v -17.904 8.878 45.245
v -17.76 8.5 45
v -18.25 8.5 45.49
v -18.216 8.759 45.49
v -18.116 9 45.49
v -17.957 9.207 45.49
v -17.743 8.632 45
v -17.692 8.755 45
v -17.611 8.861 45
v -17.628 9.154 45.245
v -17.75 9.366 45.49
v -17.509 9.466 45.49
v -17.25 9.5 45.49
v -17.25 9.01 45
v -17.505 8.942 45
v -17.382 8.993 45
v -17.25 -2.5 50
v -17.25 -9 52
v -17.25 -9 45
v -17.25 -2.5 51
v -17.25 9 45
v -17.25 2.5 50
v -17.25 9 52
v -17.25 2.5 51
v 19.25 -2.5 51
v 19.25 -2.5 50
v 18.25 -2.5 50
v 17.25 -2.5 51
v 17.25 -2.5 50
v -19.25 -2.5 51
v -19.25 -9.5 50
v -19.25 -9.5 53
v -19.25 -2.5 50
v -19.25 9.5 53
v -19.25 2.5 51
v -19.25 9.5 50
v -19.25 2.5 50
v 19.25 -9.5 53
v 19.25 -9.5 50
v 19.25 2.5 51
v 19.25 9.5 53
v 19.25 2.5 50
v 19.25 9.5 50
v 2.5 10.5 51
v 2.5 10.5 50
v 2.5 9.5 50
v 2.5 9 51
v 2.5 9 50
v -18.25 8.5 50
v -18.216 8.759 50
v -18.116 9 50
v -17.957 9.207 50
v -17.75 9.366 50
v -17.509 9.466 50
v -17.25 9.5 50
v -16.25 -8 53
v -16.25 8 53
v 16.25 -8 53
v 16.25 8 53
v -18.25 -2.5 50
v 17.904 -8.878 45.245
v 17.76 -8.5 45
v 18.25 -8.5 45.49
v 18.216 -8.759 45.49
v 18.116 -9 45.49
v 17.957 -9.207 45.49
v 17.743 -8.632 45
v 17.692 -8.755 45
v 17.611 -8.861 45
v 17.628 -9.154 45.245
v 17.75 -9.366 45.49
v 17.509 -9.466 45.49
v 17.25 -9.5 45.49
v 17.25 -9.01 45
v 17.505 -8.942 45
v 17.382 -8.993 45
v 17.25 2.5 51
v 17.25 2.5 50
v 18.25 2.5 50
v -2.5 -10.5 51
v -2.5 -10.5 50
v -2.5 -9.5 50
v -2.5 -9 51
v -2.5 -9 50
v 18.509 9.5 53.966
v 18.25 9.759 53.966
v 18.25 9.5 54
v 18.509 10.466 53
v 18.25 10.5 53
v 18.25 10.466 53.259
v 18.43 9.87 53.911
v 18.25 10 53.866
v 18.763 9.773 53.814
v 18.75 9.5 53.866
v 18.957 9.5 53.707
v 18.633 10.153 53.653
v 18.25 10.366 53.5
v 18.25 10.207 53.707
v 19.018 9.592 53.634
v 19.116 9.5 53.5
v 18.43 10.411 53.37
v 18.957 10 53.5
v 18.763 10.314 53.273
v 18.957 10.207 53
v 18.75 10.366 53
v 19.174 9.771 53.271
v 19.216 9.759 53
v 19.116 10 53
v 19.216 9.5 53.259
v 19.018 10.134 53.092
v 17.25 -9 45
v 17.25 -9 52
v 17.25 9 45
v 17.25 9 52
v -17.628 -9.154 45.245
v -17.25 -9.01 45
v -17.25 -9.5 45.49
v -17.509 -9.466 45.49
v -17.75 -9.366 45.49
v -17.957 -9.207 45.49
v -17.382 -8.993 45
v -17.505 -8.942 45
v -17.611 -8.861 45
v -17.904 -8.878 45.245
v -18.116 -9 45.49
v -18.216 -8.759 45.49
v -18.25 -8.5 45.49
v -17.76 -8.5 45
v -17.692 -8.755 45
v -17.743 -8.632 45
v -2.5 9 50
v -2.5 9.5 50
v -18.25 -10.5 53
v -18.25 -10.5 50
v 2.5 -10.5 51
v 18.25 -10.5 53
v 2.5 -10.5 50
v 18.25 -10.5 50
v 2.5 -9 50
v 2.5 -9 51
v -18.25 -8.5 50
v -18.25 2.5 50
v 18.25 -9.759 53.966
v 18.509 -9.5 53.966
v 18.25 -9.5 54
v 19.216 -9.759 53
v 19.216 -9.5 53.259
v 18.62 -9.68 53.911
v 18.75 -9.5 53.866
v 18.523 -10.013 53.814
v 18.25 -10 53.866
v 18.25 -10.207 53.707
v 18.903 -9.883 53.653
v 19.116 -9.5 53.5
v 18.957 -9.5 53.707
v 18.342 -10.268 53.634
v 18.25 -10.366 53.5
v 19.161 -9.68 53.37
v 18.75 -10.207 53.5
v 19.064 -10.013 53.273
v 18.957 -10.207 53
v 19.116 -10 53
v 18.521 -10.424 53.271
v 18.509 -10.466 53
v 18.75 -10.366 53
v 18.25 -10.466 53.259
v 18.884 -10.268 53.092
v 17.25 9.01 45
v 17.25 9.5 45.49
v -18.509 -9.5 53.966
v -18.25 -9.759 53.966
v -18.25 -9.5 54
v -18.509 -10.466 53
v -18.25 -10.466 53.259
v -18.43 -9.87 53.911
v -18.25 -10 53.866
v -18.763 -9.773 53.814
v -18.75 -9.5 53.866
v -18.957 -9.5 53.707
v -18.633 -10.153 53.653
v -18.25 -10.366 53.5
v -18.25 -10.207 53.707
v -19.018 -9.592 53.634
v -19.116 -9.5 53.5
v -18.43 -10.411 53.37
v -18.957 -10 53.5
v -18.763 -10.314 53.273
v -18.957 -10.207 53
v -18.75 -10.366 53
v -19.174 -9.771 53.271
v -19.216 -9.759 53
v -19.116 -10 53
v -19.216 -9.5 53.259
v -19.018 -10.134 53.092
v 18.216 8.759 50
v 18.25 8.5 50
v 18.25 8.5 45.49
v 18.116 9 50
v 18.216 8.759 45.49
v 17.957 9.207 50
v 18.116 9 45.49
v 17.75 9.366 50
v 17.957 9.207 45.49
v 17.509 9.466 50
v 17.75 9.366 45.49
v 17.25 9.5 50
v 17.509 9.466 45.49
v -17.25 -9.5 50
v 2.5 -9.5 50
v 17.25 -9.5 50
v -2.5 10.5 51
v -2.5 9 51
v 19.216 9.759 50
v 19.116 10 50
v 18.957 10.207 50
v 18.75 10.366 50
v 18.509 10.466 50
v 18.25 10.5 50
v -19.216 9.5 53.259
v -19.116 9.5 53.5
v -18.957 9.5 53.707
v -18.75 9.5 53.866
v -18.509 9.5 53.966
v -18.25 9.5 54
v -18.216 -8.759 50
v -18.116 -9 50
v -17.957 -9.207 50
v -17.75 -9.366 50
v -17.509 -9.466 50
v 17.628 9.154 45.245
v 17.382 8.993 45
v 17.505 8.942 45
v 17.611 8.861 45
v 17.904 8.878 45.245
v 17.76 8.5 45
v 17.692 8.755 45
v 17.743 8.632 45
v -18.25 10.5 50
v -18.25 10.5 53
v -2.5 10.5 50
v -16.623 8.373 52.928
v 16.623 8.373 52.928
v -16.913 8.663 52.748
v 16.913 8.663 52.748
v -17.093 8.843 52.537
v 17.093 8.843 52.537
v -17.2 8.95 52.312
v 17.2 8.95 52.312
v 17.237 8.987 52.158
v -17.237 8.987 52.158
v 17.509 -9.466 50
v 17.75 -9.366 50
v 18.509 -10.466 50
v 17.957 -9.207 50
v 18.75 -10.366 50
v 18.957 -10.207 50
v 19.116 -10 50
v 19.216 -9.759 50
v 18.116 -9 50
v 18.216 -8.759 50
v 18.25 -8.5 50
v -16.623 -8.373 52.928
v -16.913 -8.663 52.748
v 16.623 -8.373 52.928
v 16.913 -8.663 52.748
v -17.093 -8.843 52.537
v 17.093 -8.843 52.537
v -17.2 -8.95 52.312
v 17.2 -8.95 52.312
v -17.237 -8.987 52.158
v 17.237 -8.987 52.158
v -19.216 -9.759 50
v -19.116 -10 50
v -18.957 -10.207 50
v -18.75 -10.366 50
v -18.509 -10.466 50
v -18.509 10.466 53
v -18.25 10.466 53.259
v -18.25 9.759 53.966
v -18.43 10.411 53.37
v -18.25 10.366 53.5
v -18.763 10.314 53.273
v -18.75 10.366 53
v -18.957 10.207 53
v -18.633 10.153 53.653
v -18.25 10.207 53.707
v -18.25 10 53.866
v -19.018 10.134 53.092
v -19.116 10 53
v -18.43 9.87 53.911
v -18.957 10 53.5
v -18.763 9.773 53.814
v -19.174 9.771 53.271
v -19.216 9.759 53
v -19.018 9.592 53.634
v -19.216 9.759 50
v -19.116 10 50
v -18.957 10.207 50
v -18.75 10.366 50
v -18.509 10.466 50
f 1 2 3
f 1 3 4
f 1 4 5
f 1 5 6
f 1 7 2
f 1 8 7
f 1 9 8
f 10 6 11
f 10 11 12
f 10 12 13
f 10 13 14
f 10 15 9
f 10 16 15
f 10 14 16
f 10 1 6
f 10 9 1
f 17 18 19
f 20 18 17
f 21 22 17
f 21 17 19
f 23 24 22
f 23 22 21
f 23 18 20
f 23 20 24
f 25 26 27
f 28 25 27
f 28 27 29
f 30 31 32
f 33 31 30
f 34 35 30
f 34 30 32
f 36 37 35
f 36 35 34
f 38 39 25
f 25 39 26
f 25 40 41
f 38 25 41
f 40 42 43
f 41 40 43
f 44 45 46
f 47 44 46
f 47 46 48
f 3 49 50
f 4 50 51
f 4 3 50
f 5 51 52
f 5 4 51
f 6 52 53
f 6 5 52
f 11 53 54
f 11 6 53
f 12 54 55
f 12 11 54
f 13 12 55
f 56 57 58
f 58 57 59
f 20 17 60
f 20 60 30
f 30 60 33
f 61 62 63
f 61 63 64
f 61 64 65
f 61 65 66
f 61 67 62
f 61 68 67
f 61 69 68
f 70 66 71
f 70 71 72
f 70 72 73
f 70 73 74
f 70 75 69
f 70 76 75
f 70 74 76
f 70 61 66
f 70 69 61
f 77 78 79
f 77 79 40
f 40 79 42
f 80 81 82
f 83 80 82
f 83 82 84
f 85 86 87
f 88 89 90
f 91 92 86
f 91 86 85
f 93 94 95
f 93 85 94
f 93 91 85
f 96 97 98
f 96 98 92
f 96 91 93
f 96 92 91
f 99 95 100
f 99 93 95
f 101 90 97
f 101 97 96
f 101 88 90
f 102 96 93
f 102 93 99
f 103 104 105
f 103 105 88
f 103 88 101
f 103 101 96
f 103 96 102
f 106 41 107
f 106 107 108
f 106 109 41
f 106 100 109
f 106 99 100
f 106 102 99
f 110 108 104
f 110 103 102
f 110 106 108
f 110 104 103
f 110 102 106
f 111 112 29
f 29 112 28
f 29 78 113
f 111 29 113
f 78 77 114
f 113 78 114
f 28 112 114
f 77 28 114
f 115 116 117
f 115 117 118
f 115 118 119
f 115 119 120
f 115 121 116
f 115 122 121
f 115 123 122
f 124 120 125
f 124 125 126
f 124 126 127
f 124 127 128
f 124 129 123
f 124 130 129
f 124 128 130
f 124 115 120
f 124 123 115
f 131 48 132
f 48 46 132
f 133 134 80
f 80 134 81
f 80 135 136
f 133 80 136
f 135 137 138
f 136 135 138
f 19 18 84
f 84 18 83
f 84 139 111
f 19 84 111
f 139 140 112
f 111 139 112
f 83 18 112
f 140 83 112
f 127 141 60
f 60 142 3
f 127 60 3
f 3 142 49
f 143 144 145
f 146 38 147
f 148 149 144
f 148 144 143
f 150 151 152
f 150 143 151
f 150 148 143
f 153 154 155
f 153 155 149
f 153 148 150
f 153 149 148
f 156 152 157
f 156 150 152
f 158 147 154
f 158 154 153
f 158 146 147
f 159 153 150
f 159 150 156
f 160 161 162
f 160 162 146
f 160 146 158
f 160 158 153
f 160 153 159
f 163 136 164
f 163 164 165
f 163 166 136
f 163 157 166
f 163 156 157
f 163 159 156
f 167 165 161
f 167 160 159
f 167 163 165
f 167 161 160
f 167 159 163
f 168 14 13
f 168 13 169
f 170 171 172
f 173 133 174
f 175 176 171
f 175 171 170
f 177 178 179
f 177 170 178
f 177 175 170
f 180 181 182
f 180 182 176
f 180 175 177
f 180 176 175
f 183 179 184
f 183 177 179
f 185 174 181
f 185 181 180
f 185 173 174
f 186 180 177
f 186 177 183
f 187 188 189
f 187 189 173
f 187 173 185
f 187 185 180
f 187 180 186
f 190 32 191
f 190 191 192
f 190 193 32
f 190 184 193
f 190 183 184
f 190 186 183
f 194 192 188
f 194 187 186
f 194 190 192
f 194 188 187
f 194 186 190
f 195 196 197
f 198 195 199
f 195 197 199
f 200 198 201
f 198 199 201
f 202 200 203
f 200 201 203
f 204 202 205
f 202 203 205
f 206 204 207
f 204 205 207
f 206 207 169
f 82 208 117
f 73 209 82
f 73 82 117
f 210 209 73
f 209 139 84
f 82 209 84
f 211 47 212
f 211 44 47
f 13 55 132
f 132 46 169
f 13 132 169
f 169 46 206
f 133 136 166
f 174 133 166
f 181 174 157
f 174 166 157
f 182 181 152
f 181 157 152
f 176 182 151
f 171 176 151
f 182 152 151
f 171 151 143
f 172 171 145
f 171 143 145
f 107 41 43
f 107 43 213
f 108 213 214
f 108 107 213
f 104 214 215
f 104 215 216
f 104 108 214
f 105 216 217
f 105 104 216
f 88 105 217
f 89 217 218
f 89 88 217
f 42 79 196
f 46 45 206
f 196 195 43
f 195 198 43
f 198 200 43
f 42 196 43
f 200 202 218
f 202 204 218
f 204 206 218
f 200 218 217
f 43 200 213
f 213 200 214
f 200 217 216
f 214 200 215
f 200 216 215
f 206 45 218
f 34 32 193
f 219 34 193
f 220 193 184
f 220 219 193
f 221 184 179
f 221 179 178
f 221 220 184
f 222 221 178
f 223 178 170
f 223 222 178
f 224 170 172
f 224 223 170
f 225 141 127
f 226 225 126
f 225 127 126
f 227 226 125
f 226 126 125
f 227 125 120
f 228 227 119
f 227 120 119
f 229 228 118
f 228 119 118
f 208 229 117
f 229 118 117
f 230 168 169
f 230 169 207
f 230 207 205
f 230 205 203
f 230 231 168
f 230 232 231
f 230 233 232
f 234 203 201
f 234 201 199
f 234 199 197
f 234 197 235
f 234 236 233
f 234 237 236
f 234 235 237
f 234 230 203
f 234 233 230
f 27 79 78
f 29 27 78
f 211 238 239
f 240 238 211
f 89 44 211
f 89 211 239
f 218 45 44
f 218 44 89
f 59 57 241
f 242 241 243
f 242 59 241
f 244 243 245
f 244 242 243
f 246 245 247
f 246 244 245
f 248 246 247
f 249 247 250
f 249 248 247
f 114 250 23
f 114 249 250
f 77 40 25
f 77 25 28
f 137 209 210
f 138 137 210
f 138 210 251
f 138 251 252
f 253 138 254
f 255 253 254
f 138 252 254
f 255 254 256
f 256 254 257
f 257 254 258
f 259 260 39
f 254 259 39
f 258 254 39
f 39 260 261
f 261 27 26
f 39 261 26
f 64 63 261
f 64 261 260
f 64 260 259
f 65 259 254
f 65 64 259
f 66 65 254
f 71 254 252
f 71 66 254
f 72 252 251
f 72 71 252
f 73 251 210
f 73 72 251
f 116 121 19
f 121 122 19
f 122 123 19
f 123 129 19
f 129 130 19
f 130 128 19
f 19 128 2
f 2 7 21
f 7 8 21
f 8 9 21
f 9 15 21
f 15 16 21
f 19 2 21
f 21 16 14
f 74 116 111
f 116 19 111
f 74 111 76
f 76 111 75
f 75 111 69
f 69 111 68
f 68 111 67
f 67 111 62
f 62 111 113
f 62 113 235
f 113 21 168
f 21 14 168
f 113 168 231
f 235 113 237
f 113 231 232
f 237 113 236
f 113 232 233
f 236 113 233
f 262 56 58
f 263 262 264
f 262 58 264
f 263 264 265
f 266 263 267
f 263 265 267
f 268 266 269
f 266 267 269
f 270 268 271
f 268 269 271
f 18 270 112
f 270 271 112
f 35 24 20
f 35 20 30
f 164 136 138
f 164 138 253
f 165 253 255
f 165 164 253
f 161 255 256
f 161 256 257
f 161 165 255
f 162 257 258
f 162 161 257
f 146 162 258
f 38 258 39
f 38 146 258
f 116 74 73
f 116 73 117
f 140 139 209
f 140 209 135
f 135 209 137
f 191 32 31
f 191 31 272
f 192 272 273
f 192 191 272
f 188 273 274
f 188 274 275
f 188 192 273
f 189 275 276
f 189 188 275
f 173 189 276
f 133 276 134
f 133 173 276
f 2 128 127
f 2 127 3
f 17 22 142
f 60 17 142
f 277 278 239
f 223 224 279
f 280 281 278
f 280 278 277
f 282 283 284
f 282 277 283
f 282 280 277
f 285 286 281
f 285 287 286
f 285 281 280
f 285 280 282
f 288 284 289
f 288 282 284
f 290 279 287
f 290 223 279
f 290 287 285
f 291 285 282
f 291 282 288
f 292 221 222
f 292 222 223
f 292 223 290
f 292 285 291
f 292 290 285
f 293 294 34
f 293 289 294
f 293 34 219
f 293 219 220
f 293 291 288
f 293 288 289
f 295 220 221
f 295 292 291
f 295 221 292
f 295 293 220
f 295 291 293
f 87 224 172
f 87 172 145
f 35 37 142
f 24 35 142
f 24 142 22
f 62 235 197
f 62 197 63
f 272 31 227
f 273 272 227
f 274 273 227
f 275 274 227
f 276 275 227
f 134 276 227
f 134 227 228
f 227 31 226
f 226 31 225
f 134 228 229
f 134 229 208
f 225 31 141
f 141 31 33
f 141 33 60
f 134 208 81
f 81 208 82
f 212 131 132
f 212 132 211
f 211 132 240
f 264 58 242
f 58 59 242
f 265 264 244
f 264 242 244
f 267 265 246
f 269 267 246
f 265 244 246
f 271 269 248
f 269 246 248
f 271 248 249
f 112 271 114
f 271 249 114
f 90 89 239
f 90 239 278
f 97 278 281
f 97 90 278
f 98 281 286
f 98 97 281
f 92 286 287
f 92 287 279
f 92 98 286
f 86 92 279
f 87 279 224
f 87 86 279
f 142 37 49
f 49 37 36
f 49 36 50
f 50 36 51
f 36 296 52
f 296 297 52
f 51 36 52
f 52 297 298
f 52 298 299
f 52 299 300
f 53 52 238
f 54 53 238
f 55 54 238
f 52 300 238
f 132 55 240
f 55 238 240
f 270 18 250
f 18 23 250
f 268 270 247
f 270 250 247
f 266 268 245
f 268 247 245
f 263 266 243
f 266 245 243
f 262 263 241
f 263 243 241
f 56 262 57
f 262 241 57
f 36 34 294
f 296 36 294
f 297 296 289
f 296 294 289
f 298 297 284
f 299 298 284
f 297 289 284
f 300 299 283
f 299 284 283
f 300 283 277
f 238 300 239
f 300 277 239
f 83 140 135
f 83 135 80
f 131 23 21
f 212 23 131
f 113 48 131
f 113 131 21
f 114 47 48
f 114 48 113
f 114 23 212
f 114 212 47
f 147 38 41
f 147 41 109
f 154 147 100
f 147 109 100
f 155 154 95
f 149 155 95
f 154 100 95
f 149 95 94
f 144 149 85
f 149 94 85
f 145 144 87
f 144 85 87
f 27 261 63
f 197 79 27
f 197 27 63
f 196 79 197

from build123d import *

# Parameters (mm, degrees)
SKETCH025_W       = 36.5
SKETCH025_H       = 19
PAD016_DEPTH      = 3
THICKNESS004_T    = 1
SKETCH026_W       = 36.5
SKETCH026_H       = 19
SKETCH026_W_2     = 34.5
SKETCH026_H_2     = 18
PAD017_DEPTH      = 3
PAD017_DEPTH_BACK = 5
FILLET005_R       = 1
POCKET007_DEPTH   = 1
CHAMFER002_SIZE   = 0.49


with BuildPart() as part:
    # Sketch025 → Pad016 (new body)
    with BuildSketch(Plane.XY):
        Rectangle(SKETCH025_W, SKETCH025_H)
    extrude(amount=PAD016_DEPTH)

    # Thickness004
    thickness004_openings = [part.faces().sort_by_distance(p)[0] for p in [
        (0, 0, 0),
    ]]
    offset(amount=THICKNESS004_T, openings=thickness004_openings)

    # Sketch026 → Pad017 (join, two sides)
    with BuildSketch(Plane.XY) as pad017_sk:
        Rectangle(SKETCH026_W, SKETCH026_H)
        Rectangle(SKETCH026_W_2, SKETCH026_H_2, mode=Mode.SUBTRACT)
    extrude(amount=PAD017_DEPTH)
    extrude(pad017_sk.sketch, amount=-PAD017_DEPTH_BACK)

    # Fillet005
    fillet005_edges = [part.edges().sort_by_distance(p)[0] for p in [
        (18.25, -9.5, -2.5),
        (18.25, 9.5, -2.5),
        (-18.25, 9.5, -2.5),
        (-18.25, -9.5, -2.5),
        (0, -9, 3),
        (17.25, 0, 3),
        (0, 9, 3),
        (-17.25, 0, 3),
    ]]
    fillet(fillet005_edges, radius=FILLET005_R)

    # Sketch031 → Pocket007 (cut)
    with BuildSketch(Plane.XY):
        Polygon((-28.138837, 2.5), (-2.5, 2.5), (-2.5, 15.913807), (2.5, 15.913807), (2.5, 2.5), (28.138837, 2.5), (28.138837, -2.5), (2.5, -2.5), (2.5, -15.913807), (-2.5, -15.913807), (-2.5, -2.5), (-28.138837, -2.5), align=None)
    extrude(amount=POCKET007_DEPTH, mode=Mode.SUBTRACT)

    # Chamfer002
    chamfer002_edges = [part.edges().sort_by_distance(p)[0] for p in [
        (-18.25, 0, -5),
        (18.25, 0, -5),
    ]]
    chamfer(chamfer002_edges, length=CHAMFER002_SIZE)


with BuildPart() as part_1:
    # Body006 placement: moved
    add(part.part.moved(Location((0, 0, 50))))


solid = part_1.part
